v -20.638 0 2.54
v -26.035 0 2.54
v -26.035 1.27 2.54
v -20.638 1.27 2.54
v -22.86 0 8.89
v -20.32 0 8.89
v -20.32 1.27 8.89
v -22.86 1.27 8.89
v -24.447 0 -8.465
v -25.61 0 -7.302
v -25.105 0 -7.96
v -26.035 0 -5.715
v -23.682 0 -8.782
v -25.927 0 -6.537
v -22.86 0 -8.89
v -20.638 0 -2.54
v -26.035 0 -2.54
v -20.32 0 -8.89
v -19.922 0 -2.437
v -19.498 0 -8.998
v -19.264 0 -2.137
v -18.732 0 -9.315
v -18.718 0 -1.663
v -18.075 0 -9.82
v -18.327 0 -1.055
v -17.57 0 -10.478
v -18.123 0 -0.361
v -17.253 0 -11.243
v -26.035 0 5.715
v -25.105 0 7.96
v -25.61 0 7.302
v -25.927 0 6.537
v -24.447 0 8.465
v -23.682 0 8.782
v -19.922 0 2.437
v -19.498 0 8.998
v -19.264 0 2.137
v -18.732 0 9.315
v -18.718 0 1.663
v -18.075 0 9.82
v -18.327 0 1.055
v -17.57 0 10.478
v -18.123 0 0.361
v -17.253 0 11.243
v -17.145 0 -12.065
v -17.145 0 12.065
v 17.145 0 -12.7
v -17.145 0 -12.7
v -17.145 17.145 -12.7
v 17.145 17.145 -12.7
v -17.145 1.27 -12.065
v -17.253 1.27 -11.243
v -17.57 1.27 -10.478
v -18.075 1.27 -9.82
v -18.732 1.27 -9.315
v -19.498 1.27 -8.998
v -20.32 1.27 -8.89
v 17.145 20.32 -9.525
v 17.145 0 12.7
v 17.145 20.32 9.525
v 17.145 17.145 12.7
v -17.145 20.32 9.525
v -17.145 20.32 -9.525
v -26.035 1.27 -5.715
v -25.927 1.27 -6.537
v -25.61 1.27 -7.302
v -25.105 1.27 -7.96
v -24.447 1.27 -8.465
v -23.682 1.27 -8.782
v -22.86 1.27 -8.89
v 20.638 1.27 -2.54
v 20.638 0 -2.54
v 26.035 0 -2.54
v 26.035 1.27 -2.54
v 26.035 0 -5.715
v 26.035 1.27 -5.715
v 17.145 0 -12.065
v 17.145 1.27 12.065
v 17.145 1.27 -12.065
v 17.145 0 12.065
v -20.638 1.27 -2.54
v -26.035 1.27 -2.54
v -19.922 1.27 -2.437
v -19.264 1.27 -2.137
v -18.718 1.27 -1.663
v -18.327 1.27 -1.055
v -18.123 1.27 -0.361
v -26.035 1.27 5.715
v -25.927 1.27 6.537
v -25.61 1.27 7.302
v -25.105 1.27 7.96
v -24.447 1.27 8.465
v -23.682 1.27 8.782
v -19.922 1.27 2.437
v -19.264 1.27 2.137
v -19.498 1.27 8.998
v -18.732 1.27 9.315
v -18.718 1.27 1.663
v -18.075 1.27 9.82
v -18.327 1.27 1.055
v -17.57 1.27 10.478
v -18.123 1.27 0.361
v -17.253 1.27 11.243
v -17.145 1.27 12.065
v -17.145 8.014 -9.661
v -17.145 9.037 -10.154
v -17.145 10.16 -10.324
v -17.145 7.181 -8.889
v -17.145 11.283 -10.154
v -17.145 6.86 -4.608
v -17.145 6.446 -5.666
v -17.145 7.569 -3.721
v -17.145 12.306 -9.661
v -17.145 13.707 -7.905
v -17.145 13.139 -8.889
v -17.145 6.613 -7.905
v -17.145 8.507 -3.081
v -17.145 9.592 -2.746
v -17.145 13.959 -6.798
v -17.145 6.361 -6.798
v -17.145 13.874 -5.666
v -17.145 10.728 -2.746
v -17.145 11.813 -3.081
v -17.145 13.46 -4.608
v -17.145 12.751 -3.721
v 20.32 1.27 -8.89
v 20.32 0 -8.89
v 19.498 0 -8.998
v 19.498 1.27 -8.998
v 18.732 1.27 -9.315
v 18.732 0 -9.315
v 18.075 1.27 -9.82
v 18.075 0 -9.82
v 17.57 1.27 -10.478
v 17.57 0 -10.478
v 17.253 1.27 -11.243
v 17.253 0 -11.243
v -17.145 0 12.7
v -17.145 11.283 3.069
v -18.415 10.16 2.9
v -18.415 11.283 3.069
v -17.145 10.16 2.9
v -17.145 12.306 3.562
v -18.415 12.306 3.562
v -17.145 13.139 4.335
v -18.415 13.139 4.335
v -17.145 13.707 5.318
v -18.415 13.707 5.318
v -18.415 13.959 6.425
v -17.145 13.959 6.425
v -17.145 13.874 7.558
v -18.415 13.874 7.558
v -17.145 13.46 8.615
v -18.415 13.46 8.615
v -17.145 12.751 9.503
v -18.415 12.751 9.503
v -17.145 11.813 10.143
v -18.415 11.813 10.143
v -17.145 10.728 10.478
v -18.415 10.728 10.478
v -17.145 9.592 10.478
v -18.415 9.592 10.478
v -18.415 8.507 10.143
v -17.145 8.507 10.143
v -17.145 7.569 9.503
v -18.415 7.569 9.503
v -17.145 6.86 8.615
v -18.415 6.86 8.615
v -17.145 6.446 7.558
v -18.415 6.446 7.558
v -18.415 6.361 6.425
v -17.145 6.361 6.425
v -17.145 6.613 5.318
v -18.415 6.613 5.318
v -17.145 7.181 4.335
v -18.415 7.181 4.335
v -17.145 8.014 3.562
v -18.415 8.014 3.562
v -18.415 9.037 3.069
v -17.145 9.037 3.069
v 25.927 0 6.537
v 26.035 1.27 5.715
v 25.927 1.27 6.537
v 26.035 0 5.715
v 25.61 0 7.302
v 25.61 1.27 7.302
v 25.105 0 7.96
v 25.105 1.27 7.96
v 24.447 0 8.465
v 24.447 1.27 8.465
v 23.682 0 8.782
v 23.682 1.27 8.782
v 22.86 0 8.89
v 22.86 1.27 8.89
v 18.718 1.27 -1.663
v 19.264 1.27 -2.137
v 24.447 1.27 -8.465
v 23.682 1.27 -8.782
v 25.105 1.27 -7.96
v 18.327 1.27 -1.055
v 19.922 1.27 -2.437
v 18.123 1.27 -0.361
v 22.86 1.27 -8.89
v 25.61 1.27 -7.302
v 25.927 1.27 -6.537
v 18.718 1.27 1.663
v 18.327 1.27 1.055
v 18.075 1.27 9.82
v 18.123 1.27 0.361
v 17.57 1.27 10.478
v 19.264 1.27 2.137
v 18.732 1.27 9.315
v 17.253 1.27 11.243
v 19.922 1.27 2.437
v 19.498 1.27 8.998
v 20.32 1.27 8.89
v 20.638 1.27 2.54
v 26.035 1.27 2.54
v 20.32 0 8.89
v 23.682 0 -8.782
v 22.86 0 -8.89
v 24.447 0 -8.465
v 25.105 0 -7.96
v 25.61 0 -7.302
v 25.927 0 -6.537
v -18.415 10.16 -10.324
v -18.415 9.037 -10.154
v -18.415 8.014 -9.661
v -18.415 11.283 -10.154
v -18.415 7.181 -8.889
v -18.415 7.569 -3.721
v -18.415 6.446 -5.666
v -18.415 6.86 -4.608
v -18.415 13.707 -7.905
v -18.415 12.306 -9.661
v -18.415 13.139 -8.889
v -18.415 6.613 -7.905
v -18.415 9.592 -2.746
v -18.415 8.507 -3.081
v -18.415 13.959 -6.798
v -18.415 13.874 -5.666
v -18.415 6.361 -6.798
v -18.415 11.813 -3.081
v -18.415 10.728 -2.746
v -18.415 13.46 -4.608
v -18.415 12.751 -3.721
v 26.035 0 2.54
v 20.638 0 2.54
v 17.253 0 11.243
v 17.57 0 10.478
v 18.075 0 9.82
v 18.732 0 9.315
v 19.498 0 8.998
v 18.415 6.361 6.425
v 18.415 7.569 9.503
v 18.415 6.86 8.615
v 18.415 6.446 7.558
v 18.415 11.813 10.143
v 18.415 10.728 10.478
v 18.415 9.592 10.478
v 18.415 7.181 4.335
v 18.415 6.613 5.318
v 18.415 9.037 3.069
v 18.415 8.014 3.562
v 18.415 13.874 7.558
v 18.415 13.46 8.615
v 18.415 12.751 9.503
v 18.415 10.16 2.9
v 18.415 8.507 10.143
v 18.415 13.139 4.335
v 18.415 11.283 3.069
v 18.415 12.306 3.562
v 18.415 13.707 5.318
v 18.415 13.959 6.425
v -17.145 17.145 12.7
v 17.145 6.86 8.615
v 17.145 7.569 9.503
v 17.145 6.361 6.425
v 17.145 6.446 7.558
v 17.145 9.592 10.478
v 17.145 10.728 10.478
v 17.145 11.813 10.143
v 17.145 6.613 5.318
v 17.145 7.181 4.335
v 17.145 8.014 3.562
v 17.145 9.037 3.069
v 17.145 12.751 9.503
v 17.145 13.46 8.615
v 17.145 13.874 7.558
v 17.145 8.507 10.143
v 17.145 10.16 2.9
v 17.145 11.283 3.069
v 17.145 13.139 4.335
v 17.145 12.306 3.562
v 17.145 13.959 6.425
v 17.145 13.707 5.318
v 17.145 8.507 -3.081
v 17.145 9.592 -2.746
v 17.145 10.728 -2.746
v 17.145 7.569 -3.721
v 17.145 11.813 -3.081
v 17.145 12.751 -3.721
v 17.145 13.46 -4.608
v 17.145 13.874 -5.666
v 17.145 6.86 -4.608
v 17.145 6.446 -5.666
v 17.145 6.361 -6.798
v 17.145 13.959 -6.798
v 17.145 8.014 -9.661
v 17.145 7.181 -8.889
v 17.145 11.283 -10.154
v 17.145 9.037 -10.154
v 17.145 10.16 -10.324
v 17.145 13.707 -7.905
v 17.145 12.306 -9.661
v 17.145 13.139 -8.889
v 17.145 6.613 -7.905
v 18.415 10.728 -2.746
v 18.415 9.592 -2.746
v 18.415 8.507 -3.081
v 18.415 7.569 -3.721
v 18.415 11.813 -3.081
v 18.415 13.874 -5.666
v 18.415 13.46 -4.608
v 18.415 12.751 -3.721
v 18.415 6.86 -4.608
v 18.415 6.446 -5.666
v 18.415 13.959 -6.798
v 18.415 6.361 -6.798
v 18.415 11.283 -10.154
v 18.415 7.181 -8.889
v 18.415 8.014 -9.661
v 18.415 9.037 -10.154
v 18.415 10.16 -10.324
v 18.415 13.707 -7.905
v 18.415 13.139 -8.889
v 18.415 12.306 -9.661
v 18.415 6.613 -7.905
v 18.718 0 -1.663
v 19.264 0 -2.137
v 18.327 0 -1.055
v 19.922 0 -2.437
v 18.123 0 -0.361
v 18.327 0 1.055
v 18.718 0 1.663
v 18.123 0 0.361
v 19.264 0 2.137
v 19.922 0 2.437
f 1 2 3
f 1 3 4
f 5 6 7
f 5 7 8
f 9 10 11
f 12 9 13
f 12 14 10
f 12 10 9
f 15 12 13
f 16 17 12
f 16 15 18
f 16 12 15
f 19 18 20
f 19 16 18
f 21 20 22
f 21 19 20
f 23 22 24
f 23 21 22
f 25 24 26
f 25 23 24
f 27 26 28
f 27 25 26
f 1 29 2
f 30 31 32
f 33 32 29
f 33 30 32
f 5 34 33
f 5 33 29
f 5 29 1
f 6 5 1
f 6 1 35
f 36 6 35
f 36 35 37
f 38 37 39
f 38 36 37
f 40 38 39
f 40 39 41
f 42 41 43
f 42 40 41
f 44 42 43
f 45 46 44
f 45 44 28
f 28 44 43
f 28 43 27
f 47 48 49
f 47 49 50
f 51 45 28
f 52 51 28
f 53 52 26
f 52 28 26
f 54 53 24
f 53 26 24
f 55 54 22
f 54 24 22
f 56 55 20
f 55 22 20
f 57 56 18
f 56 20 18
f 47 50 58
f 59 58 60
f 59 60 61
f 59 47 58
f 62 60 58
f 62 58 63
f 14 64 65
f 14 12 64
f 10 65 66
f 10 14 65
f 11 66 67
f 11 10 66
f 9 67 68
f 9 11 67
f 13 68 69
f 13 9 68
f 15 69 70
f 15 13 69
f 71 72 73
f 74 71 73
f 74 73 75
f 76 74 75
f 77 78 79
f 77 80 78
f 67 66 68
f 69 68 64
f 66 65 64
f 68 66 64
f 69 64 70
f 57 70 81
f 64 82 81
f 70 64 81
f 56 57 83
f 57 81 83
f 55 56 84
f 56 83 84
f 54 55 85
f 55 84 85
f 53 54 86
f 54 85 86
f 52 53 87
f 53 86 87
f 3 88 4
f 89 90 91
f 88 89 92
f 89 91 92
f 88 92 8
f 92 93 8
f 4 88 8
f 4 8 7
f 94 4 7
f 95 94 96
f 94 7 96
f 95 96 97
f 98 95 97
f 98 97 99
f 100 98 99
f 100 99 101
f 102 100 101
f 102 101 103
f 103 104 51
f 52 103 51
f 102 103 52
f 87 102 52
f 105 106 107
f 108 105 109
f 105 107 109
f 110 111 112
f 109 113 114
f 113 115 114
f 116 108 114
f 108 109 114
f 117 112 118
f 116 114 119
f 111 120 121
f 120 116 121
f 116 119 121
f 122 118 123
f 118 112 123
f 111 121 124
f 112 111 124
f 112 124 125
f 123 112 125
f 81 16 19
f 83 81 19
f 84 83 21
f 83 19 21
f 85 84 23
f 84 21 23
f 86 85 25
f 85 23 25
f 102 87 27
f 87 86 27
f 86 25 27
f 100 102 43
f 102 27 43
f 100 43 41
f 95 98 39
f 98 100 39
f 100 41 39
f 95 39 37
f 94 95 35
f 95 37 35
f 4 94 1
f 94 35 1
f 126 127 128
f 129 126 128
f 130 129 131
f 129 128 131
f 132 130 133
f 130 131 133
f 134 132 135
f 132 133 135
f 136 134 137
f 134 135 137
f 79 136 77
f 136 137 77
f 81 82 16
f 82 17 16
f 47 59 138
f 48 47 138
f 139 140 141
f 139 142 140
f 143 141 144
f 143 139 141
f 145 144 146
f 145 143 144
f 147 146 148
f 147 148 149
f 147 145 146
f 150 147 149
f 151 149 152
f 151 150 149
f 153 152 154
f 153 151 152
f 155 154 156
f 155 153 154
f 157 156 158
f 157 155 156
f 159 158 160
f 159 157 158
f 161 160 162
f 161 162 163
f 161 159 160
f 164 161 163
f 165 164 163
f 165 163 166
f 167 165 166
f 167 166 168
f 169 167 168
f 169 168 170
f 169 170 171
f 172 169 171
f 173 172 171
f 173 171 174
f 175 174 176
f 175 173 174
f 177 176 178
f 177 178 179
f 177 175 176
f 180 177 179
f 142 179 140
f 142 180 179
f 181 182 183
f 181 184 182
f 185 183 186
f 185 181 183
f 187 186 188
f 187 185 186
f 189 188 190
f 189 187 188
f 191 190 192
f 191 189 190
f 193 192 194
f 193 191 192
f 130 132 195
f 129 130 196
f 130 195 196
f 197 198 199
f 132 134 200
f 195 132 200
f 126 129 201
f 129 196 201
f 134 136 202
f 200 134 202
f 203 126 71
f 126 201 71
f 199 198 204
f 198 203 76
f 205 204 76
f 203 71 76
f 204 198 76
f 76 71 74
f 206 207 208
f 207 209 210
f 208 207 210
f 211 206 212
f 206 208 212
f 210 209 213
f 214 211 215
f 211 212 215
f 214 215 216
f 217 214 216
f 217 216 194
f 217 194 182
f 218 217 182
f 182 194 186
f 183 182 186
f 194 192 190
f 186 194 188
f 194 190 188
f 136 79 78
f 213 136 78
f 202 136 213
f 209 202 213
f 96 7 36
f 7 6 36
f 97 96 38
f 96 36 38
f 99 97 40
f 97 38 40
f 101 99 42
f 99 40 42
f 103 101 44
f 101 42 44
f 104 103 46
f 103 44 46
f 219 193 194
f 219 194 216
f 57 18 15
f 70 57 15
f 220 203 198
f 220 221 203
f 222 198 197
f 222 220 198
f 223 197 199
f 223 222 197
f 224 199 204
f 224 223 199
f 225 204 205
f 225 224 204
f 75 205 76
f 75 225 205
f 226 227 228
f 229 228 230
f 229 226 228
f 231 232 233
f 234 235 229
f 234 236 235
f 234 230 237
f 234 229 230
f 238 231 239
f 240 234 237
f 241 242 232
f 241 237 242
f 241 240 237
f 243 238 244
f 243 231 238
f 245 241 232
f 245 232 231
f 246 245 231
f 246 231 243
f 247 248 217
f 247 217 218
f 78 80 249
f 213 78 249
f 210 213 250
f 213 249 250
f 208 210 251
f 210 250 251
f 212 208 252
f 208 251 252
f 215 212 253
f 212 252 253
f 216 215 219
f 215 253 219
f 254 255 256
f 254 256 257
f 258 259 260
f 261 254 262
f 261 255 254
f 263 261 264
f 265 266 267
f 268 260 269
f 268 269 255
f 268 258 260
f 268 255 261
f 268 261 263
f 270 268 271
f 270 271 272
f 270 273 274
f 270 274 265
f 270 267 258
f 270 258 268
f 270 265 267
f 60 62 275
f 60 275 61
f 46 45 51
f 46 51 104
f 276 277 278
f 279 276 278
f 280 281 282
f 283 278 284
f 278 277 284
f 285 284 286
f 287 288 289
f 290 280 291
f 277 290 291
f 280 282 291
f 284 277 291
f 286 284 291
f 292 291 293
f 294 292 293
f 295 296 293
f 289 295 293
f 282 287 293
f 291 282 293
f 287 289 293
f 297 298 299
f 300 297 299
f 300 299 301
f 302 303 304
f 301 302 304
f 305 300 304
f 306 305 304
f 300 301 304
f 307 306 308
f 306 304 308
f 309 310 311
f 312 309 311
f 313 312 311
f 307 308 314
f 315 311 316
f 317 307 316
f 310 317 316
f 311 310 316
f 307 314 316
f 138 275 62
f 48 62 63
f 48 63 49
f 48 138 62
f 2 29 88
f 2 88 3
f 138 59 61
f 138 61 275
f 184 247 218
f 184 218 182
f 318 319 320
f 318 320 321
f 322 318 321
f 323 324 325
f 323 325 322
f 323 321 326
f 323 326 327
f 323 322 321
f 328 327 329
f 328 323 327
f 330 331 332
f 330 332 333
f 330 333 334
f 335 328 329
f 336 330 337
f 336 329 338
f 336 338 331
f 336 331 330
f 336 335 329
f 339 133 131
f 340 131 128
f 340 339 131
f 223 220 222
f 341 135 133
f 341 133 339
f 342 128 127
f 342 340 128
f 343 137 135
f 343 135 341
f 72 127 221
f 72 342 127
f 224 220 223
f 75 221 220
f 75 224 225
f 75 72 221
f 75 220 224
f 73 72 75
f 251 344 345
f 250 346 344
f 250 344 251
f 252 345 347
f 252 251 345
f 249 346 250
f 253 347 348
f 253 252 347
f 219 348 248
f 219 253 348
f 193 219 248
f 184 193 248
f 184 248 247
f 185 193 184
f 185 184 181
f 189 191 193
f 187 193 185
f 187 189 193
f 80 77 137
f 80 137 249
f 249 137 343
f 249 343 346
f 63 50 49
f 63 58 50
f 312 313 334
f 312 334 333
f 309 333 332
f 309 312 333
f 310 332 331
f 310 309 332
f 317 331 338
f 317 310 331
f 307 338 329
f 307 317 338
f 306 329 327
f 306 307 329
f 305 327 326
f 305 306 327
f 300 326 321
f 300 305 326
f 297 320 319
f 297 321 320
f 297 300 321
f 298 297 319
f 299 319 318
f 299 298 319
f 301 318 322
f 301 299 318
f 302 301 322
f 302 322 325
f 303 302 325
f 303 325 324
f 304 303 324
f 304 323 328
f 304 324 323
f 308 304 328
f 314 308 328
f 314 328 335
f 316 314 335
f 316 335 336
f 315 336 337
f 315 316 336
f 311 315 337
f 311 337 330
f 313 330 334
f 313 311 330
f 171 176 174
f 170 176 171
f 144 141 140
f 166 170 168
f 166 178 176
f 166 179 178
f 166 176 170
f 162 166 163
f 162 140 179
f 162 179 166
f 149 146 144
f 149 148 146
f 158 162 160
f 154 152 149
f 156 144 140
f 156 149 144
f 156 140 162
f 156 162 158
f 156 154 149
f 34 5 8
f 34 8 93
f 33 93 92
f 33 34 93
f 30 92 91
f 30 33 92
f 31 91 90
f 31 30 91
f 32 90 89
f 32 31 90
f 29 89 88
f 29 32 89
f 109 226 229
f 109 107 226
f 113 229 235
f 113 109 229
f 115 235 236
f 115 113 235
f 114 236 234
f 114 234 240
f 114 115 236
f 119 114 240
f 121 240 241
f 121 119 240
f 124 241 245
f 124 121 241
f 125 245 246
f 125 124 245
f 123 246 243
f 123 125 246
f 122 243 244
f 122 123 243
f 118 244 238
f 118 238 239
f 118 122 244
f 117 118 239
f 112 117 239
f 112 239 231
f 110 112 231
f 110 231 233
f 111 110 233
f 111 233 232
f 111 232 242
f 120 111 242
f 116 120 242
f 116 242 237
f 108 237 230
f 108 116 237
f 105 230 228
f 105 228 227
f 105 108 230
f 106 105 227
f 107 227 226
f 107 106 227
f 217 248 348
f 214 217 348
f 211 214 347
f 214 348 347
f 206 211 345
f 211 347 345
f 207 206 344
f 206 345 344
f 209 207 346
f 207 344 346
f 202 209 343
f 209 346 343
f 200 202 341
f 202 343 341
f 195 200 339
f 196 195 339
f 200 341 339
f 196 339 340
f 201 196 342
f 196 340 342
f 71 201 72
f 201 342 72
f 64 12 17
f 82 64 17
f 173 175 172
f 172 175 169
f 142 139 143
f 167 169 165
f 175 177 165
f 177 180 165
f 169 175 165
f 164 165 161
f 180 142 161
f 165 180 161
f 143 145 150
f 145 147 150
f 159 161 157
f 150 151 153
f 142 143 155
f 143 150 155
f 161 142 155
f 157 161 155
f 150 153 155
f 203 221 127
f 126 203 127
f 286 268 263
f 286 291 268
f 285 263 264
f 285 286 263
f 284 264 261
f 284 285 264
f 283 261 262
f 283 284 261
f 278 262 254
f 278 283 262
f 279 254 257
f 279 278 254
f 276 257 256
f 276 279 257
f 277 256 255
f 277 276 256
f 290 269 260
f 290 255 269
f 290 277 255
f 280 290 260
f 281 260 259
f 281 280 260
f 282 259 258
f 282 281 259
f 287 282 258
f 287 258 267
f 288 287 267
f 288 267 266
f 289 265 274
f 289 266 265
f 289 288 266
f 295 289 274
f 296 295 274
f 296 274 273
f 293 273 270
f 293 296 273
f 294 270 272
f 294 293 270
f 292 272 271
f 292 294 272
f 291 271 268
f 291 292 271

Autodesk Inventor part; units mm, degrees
ref_plane "YZ Plane" through (0, 0, 0) normal (1, 0, 0) x (0, 1, 0)
ref_plane "XZ Plane" through (0, 0, 0) normal (0, 1, 0) x (-1, 0, 0)
sketch "Sketch1" plane through (0, 0, 0) normal (0, 1, 0) x (-1, 0, 0)
  line L0 (-17.145, 12.7) -> (17.145, 12.7)
  line L1 (17.145, 12.7) -> (17.145, -12.7)
  line L2 (17.145, -12.7) -> (-17.145, -12.7)
  line L3 (-17.145, -12.7) -> (-17.145, 12.7)
  line L4 (-17.145, 12.7) -> (17.145, -12.7) construction
  line L5 (17.145, 12.7) -> (-17.145, -12.7) construction
  point P0 (0, 0)
  dimension "d0" = 34.29
  dimension "d1" = 25.4
extrude "Extrusion1" add sketch "Sketch1" along normal blind 20.32
sketch "Sketch2" plane through (17.145, 0, 12.7) normal (1, 0, 0) x (0, 0, -1)
  line L0 (0, 0) -> (25.4, 0) projected
  line L1 (25.4, 0) -> (25.4, 20.32) projected
  line L2 (0, 20.32) -> (25.4, 20.32) projected
  line L3 (0, 0) -> (0, 20.32) projected
  circle A0 centre (19.2135, 10.16) radius 3.81
  circle A1 centre (5.9899, 10.16) radius 3.81
  point P0 (12.7, 0)
  dimension "d4" = 7.62
  dimension "d5" = 7.62
ref_plane "Work Plane1" through (0, 0, 12.7) normal (1, 0, 0) x (0, 0, -1)
extrude "Extrusion2" add sketch "Sketch2" along normal blind 1.27 separate body contours A0 | A1
mirror "Mirror1" about plane through (0, 0, 12.7) normal (1, 0, 0) of "Extrusion2" bodies 2
sketch "Sketch3" plane through (0, 0, 0) normal (0, -1, 0) x (1, 0, 0)
  line L0 (17.145, -12.7) -> (-17.145, -12.7) projected
  line L1 (17.145, 12.7) -> (17.145, -12.7) projected
  line L2 (-17.145, 12.7) -> (17.145, 12.7) projected
  line L3 (-17.145, -12.7) -> (-17.145, 12.7) projected
  line L4 (16.1925, 2.54) -> (18.0975, 2.54)
  line L5 (18.0975, 2.54) -> (18.0975, 0)
  line L6 (18.0975, -2.54) -> (16.1925, -2.54)
  line L7 (16.1925, -2.54) -> (16.1925, 2.54)
  line L8 (16.1925, 2.54) -> (18.0975, -2.54) construction
  line L9 (18.0975, 2.54) -> (16.1925, -2.54) construction
  line L10 (20.6375, -2.54) -> (26.035, -2.54)
  line L11 (26.035, -2.54) -> (26.035, -5.715)
  line L12 (22.86, -8.89) -> (20.32, -8.89)
  arc A0 (22.86, -8.89) -> (26.035, -5.715) centre (22.86, -5.715) ccw
  arc A1 (18.0975, 0) -> (20.6375, -2.54) centre (20.6375, 0) ccw
  line L13 (22.86, 0) -> (28.1937, 0)
  line L14 (17.145, 12.7) -> (-17.145, 12.7)
  line L15 (17.145, -12.7) -> (17.145, -12.065)
  line L16 (18.0975, 2.54) -> (16.1925, 2.54)
  line L17 (16.1925, 2.54) -> (16.1925, -2.54)
  line L18 (16.1925, -2.54) -> (18.0975, 2.54) construction
  line L19 (18.0975, -2.54) -> (16.1925, 2.54) construction
  line L20 (20.6375, 2.54) -> (26.035, 2.54)
  line L21 (26.035, 2.54) -> (26.035, 5.715)
  line L22 (22.86, 8.89) -> (20.32, 8.89)
  arc A2 (26.035, 5.715) -> (22.86, 8.89) centre (22.86, 5.715) ccw
  arc A3 (20.6375, 2.54) -> (18.0975, 0) centre (20.6375, 0) ccw
  arc A4 (20.32, -8.89) -> (17.145, -12.065) centre (20.32, -12.065) ccw
  line L23 (17.145, 12.7) -> (17.145, 12.065)
  arc A5 (17.145, 12.065) -> (20.32, 8.89) centre (20.32, 12.065) ccw
  point P0 (0, 0)
  point P1 (17.145, 0)
  point P2 (17.145, -2.54)
  point P3 (26.035, -8.89)
  point P4 (17.145, -8.89)
  point P5 (17.145, 2.54)
  point P6 (26.035, 8.89)
  point P7 (17.145, 8.89)
  dimension "d8" = 1.905
  dimension "d9" = 5.08
  dimension "d10" = 8.89
  dimension "d11" = 6.35
  dimension "d12" = 3.175
  dimension "d13" = 2.54
  dimension "d14" = 3.175
  dimension "d15" = 3.175
extrude "Extrusion3" add sketch "Sketch3" against normal blind 1.27 separate body contours L1 L4 L5 A1 L10 L11 A0 L12 A4 | L1 A5 L22 A2 L21 L20 A3 L5 L4
mirror "Mirror2" about plane through (0, 0, 12.7) normal (1, 0, 0) of "Extrusion3" bodies 3
chamfer "Chamfer1" distance 3.175 angle 45 2 edges at (0, 20.32, 12.7) (0, 20.32, -12.7)
properties part number "5vconverter"
